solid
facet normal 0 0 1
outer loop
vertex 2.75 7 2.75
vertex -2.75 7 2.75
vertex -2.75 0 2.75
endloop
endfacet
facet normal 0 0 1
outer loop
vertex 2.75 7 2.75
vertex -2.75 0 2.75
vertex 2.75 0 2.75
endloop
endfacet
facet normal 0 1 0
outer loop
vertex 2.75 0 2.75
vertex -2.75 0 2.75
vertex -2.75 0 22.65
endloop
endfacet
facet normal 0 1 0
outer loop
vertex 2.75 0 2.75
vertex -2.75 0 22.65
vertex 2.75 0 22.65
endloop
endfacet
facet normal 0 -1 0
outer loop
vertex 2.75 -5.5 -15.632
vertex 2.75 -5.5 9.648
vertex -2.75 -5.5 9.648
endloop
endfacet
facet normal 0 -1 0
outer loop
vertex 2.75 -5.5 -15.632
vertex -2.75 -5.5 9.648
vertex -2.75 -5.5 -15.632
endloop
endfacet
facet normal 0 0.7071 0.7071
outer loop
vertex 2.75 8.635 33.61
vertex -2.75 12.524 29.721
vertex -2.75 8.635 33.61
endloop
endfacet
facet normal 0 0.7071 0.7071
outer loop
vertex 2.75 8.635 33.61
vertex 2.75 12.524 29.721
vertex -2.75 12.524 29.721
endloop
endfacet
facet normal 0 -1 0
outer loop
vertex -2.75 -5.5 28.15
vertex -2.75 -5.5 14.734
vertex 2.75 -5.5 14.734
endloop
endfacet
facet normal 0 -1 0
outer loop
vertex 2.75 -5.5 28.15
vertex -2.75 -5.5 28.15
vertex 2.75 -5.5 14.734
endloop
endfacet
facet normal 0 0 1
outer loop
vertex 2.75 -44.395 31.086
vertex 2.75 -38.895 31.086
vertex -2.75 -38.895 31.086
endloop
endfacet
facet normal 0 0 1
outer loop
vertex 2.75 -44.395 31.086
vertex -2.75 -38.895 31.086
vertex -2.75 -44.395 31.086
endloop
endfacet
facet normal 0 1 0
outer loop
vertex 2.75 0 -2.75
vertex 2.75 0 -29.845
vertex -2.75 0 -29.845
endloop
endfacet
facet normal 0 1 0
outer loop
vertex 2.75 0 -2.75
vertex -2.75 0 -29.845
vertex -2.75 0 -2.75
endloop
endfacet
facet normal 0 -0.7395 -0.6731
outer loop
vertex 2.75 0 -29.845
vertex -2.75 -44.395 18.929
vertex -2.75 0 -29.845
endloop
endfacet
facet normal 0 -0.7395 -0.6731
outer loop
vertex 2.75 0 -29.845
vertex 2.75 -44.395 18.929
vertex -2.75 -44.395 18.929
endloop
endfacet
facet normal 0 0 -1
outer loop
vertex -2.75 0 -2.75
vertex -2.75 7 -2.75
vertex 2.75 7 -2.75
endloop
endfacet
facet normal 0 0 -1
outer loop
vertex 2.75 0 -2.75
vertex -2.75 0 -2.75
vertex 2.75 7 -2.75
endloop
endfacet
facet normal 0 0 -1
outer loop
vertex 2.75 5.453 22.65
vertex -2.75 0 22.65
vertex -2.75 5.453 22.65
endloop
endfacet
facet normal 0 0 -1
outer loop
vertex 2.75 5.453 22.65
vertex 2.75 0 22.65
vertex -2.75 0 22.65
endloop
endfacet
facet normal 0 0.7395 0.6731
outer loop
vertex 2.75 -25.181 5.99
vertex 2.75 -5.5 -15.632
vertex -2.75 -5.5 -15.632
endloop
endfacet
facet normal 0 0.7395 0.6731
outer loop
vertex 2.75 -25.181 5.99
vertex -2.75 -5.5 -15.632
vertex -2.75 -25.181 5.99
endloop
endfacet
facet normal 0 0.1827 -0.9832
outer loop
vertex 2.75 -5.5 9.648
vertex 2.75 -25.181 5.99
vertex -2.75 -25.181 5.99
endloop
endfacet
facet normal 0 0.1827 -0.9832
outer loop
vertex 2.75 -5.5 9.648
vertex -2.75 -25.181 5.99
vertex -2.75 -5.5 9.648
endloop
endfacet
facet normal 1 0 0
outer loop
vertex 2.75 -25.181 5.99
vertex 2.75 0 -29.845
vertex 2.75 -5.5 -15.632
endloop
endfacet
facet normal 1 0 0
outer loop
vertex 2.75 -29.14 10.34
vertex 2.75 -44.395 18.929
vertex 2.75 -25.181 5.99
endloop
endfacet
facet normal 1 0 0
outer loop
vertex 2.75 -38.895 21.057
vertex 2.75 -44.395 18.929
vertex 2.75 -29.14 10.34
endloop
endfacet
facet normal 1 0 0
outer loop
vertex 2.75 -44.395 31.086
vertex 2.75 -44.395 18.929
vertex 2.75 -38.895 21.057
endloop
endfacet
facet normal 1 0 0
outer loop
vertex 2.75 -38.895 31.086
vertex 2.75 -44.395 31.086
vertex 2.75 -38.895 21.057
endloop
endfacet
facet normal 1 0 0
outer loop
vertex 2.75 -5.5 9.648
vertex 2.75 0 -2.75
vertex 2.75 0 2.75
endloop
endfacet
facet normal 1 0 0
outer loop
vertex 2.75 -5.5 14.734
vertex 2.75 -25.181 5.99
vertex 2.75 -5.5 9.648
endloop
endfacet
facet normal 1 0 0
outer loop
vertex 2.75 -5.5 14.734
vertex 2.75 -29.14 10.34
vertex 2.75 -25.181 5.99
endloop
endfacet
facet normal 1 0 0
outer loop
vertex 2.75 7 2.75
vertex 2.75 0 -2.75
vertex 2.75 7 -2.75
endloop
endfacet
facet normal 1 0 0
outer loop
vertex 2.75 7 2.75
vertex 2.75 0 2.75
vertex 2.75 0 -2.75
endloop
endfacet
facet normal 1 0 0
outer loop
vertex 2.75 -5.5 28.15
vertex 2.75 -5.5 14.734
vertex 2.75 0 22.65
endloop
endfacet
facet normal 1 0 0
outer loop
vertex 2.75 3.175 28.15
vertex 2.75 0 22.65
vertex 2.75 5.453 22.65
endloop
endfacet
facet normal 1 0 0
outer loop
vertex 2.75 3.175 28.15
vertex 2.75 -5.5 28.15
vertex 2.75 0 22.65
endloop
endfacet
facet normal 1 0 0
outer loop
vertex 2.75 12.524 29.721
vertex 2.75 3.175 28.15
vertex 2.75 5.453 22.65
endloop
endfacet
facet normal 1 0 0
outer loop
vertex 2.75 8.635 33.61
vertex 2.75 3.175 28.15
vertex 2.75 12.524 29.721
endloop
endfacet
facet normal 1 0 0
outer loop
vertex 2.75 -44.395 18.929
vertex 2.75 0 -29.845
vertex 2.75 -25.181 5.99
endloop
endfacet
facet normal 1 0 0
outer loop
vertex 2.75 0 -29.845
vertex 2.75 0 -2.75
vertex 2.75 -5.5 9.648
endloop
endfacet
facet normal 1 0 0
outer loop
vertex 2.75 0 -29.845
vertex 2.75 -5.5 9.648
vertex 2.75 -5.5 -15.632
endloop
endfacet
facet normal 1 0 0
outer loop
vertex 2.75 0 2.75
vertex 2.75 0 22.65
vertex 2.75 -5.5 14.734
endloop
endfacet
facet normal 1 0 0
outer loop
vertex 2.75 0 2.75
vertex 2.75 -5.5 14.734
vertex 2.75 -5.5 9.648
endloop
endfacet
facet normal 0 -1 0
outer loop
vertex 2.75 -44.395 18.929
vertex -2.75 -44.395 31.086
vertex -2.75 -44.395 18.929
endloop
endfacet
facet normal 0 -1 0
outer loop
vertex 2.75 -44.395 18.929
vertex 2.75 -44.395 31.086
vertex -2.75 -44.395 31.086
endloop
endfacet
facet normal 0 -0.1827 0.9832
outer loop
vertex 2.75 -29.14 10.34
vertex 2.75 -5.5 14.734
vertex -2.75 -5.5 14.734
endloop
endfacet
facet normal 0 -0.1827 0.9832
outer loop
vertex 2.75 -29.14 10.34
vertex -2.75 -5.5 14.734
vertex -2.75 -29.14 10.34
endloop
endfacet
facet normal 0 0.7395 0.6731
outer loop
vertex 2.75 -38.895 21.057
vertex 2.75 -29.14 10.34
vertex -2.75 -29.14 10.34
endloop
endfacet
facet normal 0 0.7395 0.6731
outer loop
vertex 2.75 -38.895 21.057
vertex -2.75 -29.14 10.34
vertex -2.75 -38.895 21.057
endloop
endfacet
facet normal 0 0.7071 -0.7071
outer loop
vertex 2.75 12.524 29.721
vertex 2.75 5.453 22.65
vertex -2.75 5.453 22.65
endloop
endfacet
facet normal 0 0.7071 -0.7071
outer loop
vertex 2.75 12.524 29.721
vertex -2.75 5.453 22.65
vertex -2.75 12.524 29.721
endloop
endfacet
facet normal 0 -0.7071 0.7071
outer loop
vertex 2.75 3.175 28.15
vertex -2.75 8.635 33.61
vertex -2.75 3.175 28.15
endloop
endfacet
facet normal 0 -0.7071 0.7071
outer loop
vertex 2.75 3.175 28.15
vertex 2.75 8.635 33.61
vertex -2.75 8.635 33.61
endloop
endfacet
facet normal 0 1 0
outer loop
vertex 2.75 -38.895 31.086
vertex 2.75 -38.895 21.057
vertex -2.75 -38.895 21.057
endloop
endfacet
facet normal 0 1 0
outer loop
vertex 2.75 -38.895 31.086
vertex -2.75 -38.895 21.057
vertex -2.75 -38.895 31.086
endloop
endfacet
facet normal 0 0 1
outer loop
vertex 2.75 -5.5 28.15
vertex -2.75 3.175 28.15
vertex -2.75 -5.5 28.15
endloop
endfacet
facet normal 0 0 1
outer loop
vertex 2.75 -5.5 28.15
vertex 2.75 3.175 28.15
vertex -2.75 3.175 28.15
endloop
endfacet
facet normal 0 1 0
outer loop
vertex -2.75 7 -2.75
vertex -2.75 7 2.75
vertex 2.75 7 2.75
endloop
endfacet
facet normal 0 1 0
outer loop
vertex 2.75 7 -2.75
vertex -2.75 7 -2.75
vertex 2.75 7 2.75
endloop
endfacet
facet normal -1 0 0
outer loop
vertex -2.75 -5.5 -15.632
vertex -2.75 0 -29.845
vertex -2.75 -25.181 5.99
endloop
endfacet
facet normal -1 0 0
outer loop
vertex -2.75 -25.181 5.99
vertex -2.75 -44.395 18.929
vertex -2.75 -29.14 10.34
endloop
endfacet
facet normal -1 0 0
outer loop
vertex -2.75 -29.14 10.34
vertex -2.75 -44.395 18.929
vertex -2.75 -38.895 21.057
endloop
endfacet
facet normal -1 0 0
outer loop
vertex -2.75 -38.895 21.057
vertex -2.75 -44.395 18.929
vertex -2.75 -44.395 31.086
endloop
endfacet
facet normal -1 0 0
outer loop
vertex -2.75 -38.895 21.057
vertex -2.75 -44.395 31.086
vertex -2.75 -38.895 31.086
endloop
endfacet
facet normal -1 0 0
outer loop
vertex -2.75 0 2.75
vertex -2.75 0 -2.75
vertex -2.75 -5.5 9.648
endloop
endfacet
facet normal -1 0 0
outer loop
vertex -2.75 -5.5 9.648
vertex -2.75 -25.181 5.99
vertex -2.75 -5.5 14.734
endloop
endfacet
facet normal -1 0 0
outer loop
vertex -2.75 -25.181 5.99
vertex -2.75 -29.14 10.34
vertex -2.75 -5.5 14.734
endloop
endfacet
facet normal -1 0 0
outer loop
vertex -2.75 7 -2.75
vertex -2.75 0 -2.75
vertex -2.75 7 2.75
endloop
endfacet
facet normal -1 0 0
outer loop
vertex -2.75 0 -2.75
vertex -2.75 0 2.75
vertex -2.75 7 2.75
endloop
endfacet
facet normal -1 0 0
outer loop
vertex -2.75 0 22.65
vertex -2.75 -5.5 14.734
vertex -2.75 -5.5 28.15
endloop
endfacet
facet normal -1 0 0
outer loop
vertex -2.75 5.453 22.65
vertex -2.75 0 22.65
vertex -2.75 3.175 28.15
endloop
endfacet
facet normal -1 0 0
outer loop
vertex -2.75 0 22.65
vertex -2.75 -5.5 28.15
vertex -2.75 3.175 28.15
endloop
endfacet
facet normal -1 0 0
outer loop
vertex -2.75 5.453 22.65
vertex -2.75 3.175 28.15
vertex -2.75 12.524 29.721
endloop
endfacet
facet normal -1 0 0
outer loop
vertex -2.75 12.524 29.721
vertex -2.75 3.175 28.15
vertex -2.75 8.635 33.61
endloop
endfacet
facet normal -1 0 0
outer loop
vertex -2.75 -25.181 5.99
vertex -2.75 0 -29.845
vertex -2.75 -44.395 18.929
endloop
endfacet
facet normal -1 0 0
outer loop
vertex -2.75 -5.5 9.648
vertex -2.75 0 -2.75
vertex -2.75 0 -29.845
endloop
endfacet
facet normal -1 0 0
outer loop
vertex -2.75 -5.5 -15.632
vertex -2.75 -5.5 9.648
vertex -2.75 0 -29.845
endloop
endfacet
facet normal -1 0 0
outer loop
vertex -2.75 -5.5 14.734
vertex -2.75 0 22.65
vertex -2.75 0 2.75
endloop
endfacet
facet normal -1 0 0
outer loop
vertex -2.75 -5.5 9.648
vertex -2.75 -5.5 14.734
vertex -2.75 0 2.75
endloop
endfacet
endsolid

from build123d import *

# Parameters (mm, degrees)
F1_W          = 5.5
F1_H          = 5.5
F2_DEPTH      = 7
F2_DEPTH_BACK = 5.5
F3_W          = 5.5
F3_H          = 5.5
F4_DEPTH      = 5.5
F5_W          = 5.5
F5_H          = 5.5
F6_DEPTH      = 19.9
F8_DEPTH      = 2.75
F8_DEPTH_BACK = 2.75
F10_DEPTH     = 2.75


with BuildPart() as f2:
    # F1 (on Front) → F2 (new body, two sides)
    with BuildSketch(Plane.XZ) as f2_sk:
        Rectangle(F1_W, F1_H)
    extrude(amount=-F2_DEPTH)
    extrude(f2_sk.sketch, amount=F2_DEPTH_BACK)



with BuildPart() as f4:
    # F3 (on Front) → F4 (new body, through all)
    with BuildSketch(Plane.XZ):
        with Locations((0, 25.4)):
            Rectangle(F3_W, F3_H)
    extrude(amount=F4_DEPTH)


with BuildPart() as f2_1:
    add(f2.part)

    add(f4.part)  # F6 merges F4
    # F5 (on face) → F6 (join, through all)
    with BuildSketch(Plane.XY.offset(2.75)):
        with Locations((0, -2.75)):
            Rectangle(F5_W, F5_H)
    extrude(amount=F6_DEPTH)

    # F7 (on Right) → F8 (join, two sides)
    with BuildSketch(Plane.YZ) as f8_sk:
        Polygon((3.175, 28.15), (0, 28.15), (0, 22.65), (5.4531745931, 22.65), (12.5242424049, 29.7210678119), (8.6351551084, 33.6101551084), align=None)
    extrude(amount=F8_DEPTH)
    extrude(f8_sk.sketch, amount=-F8_DEPTH_BACK)

    # F9 (on Right) → F10 (join, symmetric)
    with BuildSketch(Plane.YZ):
        Polygon((0, -29.8453345895), (0, 0), (-5.5, 0), (-5.5, -15.6319836834), (-25.1807147937, 5.9900909129), (-28.2262068887, 5.4240246833), (-29.1399087291, 10.3398306206), (-38.8949113266, 21.0570934874), (-38.8949113266, 31.0857333243), (-44.3949113267, 31.0857333243), (-44.3949113267, 18.9288128167), align=None)
        Polygon((-28.2262068887, 5.4240246833), (-25.1807147937, 5.9900909129), (-29.1399087291, 10.3398306206), align=None)
        Polygon((-29.1399087291, 10.3398306206), (-25.1807147937, 5.9900909129), (-4.4631796137, 9.8408633531), (-5.3768814541, 14.7566692904), align=None)
    extrude(amount=F10_DEPTH, both=True)


solid = f2_1.part
